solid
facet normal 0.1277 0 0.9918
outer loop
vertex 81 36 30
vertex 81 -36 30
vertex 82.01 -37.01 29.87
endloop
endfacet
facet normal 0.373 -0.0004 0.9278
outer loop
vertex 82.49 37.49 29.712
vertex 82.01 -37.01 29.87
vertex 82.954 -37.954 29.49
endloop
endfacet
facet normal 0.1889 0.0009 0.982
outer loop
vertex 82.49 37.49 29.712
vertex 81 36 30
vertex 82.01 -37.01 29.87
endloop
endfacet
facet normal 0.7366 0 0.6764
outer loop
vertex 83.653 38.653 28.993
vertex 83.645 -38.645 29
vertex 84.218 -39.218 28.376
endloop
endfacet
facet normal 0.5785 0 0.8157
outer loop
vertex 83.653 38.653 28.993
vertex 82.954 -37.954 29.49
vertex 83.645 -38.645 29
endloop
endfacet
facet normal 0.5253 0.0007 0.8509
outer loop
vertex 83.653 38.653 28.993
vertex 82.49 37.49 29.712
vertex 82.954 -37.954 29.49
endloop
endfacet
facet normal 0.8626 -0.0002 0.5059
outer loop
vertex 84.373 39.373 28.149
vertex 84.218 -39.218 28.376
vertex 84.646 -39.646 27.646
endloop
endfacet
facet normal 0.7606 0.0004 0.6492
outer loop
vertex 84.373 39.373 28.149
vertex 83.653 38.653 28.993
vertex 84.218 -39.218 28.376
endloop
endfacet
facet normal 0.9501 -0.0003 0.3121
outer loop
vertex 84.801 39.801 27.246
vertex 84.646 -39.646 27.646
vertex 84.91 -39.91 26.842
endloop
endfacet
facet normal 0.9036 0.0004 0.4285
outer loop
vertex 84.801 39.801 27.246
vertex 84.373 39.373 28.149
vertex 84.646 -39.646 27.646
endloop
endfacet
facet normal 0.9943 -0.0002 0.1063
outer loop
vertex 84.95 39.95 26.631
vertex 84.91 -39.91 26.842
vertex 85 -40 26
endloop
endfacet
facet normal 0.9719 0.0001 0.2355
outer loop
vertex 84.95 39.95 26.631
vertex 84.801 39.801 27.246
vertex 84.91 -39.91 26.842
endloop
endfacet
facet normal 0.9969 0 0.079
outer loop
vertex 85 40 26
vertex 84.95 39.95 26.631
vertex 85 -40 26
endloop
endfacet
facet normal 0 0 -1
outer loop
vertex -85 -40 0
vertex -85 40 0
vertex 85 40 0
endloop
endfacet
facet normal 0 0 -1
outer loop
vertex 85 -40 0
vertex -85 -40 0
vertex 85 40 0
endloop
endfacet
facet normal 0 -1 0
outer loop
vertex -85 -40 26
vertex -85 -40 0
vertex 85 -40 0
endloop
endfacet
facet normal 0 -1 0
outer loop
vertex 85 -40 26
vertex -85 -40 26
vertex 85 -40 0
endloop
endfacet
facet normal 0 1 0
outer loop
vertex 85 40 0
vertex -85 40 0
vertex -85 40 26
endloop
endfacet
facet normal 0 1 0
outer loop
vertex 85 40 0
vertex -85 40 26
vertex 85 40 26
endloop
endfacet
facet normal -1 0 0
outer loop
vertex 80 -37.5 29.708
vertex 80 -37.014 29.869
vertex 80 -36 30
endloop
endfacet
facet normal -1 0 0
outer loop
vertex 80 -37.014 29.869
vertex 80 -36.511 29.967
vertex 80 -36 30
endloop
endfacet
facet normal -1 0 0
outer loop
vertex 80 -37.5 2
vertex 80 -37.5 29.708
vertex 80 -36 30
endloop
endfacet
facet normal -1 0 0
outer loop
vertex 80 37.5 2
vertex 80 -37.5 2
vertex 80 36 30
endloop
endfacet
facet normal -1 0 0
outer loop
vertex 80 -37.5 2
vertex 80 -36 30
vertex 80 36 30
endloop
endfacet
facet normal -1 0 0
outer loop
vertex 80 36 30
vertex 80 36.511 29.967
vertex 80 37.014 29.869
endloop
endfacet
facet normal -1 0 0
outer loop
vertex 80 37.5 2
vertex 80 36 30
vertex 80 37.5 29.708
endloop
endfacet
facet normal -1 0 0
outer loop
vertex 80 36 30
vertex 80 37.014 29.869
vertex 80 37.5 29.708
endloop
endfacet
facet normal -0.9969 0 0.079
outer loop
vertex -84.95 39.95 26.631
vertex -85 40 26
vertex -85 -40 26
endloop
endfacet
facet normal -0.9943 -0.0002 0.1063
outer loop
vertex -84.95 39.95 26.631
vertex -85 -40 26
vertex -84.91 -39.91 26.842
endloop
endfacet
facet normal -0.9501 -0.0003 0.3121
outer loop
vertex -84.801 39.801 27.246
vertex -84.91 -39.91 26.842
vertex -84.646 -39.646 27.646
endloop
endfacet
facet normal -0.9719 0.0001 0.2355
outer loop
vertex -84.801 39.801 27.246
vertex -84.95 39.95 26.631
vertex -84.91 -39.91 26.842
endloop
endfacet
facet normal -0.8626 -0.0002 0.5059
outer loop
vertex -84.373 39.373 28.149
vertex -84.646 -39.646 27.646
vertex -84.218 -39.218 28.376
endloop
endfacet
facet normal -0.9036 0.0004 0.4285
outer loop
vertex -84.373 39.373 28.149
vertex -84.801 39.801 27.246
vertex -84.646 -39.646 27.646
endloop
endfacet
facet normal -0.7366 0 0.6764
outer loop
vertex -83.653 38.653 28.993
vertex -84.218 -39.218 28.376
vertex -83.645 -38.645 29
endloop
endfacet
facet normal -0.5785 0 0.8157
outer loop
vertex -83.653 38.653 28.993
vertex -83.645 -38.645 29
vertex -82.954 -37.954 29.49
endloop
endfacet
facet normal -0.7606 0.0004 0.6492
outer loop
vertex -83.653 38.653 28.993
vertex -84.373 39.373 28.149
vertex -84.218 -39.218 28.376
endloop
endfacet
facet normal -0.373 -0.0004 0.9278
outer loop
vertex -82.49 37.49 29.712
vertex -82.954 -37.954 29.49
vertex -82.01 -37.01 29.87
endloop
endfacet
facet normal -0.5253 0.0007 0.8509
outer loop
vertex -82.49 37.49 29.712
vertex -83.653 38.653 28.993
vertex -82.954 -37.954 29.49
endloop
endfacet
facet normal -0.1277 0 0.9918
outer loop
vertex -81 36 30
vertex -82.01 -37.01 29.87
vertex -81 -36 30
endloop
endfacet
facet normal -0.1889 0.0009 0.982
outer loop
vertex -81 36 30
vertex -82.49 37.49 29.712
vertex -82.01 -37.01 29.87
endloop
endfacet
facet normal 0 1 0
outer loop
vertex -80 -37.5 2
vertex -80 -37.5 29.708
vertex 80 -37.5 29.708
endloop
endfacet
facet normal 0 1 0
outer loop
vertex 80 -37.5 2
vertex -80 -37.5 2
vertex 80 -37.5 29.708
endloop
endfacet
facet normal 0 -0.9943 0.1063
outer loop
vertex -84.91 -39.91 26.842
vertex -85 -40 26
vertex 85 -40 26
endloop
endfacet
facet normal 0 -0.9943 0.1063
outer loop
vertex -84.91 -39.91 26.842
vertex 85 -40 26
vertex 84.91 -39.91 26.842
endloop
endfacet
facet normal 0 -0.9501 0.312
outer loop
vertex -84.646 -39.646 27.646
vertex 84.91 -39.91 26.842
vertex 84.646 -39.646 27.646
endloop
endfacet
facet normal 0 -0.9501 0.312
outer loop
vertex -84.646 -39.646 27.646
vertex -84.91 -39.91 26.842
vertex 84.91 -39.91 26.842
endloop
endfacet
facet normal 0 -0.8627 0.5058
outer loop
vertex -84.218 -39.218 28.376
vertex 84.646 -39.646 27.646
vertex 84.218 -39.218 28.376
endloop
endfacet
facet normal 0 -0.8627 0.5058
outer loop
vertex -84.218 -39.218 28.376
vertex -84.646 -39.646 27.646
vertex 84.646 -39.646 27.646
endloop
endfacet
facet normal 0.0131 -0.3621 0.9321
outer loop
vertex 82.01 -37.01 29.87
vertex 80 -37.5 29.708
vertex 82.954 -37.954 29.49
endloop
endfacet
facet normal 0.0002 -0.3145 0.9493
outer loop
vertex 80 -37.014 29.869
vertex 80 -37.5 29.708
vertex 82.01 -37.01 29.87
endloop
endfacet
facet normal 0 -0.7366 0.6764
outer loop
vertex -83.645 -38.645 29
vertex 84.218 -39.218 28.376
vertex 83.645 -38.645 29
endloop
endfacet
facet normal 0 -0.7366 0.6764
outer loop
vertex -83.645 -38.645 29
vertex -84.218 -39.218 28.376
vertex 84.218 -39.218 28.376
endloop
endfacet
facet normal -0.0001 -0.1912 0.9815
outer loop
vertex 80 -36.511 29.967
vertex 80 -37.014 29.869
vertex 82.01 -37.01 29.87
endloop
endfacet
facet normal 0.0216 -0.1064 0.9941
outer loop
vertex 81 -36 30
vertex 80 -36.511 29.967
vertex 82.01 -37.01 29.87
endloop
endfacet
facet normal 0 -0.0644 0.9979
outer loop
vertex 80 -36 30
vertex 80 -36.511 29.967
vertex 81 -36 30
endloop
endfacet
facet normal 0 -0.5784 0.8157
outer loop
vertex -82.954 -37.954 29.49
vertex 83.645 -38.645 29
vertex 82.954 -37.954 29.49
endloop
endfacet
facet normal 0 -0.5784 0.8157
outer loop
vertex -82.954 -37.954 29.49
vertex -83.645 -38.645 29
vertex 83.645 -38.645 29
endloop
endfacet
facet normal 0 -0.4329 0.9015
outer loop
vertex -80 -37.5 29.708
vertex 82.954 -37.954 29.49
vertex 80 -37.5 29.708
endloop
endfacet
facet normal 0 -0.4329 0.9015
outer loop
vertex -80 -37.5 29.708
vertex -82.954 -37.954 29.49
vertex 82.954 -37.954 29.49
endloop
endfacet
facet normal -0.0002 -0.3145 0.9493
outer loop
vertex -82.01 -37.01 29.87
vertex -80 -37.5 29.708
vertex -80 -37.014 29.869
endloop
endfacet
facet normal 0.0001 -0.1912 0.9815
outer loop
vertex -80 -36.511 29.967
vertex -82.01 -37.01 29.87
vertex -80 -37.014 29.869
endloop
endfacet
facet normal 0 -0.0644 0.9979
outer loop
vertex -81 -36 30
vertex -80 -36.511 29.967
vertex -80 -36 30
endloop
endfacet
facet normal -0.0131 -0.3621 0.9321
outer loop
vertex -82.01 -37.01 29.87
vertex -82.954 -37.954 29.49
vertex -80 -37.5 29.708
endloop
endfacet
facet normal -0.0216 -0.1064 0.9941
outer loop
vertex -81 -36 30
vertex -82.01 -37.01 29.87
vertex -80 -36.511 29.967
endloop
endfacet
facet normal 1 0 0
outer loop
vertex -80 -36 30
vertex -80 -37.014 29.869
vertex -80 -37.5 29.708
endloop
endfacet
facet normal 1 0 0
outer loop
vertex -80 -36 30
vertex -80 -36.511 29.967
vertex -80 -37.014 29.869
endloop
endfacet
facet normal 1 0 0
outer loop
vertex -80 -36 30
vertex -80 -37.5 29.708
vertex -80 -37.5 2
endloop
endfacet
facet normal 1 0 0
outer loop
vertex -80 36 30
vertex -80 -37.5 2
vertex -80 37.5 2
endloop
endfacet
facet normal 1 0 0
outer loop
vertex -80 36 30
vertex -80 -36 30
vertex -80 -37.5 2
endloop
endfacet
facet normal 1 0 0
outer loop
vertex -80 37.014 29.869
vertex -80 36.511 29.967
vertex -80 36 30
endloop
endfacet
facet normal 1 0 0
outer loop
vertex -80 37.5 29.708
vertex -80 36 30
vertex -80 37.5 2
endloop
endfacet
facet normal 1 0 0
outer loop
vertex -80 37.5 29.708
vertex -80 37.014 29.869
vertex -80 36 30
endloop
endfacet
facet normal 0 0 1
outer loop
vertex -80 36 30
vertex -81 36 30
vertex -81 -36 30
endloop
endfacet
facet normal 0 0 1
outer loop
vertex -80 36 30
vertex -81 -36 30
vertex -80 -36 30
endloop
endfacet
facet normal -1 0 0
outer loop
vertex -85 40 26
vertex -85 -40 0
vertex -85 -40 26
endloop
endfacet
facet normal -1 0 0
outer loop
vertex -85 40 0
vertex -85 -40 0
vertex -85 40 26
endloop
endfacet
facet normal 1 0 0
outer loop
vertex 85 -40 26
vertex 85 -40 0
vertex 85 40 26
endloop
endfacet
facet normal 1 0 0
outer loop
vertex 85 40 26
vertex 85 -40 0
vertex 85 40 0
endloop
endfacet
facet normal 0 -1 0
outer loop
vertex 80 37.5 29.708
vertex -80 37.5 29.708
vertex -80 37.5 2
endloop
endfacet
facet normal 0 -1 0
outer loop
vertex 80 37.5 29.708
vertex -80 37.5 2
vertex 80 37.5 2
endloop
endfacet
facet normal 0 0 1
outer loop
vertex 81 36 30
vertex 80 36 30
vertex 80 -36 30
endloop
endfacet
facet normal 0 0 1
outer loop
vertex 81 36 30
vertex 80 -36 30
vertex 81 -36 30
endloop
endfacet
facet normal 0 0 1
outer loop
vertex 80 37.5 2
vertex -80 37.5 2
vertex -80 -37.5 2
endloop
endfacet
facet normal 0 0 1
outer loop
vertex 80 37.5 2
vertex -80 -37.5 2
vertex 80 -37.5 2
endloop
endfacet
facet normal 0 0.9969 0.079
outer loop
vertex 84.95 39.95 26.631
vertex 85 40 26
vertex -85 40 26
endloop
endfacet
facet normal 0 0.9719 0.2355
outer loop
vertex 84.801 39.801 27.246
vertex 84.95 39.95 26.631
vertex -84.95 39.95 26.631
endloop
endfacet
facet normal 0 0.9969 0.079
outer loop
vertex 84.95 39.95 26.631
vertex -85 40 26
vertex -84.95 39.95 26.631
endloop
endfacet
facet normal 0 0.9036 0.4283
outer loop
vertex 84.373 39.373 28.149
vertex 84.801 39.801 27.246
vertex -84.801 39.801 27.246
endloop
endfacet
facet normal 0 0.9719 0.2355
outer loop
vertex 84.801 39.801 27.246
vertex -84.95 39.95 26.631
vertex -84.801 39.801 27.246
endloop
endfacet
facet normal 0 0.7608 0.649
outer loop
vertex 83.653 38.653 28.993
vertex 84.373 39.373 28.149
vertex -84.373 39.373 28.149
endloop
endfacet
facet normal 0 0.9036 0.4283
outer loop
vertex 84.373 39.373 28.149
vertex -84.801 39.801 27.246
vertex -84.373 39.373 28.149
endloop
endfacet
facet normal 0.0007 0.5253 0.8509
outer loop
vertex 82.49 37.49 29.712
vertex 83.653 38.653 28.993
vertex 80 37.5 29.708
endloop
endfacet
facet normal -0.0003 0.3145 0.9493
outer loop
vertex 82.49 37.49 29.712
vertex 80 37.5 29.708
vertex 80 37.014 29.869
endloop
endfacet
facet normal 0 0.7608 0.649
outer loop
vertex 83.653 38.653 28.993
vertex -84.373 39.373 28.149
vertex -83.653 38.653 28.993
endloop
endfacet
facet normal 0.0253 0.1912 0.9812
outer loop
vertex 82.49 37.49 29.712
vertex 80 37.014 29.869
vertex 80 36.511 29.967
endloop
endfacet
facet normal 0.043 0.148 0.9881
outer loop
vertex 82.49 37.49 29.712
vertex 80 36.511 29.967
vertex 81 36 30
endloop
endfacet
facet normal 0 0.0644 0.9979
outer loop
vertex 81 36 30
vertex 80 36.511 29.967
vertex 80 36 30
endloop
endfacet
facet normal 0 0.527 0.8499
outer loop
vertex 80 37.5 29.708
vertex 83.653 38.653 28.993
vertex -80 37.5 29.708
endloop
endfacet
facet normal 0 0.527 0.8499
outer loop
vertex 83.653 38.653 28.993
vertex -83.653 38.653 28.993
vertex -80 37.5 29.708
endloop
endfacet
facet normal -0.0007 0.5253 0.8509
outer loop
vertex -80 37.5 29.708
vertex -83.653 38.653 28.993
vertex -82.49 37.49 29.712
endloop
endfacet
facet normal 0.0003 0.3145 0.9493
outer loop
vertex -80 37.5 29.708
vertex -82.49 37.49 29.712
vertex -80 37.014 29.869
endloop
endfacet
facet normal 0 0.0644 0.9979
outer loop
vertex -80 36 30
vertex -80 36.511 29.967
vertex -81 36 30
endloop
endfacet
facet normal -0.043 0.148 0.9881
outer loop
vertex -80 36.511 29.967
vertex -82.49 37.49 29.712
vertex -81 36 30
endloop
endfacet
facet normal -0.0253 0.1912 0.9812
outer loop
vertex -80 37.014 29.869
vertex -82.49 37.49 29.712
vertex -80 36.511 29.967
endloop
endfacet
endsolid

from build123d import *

# Parameters (mm, degrees)
F0_W        = 170
F0_H        = 80
F1_DEPTH    = 30
F2_W        = 160
F2_H        = 75
F3_DEPTH    = 28
F4_T1_DEPTH = 190
F4_T3_DEPTH = 100


# Not quite as in the source:
# - a fillet or chamfer that OpenCascade refuses, or shapes differently, is made with other operations: its cross-section is extruded or revolved along the edge and cut away or added


with BuildPart() as f1:
    # F0 (on Top) → F1 (new body)
    with BuildSketch(Plane.XY):
        Rectangle(F0_W, F0_H)
    extrude(amount=F1_DEPTH)

    # F2 (on face) → F3 (cut)
    with BuildSketch(Plane.XY.offset(30)):
        Rectangle(F2_W, F2_H)
    extrude(amount=-F3_DEPTH, mode=Mode.SUBTRACT)

    # F4: fillet of radius 4 on 4 edges, made by hand

    # F4_s2 → F4_t1 (cut)
    with BuildSketch(Plane.YZ.offset(-95)):
        with BuildLine():
            ThreePointArc((-40, 26), (-38.8284271247, 28.8284271247), (-36, 30))
            Line((-36, 30), (-40, 30))
            Line((-40, 30), (-40, 26))
        make_face()
        with BuildLine():
            ThreePointArc((40, 26), (38.8284271247, 28.8284271247), (36, 30))
            Line((36, 30), (40, 30))
            Line((40, 30), (40, 26))
        make_face()
    extrude(amount=F4_T1_DEPTH, mode=Mode.SUBTRACT)

    # F4_s4 → F4_t3 (cut)
    with BuildSketch(Plane.XZ.offset(-50)):
        with BuildLine():
            ThreePointArc((-85, 26), (-83.8284271247, 28.8284271247), (-81, 30))
            Line((-81, 30), (-85, 30))
            Line((-85, 30), (-85, 26))
        make_face()
        with BuildLine():
            ThreePointArc((81, 30), (83.8284271247, 28.8284271247), (85, 26))
            Line((85, 26), (85, 30))
            Line((85, 30), (81, 30))
        make_face()
    extrude(amount=F4_T3_DEPTH, mode=Mode.SUBTRACT)


solid = f1.part
